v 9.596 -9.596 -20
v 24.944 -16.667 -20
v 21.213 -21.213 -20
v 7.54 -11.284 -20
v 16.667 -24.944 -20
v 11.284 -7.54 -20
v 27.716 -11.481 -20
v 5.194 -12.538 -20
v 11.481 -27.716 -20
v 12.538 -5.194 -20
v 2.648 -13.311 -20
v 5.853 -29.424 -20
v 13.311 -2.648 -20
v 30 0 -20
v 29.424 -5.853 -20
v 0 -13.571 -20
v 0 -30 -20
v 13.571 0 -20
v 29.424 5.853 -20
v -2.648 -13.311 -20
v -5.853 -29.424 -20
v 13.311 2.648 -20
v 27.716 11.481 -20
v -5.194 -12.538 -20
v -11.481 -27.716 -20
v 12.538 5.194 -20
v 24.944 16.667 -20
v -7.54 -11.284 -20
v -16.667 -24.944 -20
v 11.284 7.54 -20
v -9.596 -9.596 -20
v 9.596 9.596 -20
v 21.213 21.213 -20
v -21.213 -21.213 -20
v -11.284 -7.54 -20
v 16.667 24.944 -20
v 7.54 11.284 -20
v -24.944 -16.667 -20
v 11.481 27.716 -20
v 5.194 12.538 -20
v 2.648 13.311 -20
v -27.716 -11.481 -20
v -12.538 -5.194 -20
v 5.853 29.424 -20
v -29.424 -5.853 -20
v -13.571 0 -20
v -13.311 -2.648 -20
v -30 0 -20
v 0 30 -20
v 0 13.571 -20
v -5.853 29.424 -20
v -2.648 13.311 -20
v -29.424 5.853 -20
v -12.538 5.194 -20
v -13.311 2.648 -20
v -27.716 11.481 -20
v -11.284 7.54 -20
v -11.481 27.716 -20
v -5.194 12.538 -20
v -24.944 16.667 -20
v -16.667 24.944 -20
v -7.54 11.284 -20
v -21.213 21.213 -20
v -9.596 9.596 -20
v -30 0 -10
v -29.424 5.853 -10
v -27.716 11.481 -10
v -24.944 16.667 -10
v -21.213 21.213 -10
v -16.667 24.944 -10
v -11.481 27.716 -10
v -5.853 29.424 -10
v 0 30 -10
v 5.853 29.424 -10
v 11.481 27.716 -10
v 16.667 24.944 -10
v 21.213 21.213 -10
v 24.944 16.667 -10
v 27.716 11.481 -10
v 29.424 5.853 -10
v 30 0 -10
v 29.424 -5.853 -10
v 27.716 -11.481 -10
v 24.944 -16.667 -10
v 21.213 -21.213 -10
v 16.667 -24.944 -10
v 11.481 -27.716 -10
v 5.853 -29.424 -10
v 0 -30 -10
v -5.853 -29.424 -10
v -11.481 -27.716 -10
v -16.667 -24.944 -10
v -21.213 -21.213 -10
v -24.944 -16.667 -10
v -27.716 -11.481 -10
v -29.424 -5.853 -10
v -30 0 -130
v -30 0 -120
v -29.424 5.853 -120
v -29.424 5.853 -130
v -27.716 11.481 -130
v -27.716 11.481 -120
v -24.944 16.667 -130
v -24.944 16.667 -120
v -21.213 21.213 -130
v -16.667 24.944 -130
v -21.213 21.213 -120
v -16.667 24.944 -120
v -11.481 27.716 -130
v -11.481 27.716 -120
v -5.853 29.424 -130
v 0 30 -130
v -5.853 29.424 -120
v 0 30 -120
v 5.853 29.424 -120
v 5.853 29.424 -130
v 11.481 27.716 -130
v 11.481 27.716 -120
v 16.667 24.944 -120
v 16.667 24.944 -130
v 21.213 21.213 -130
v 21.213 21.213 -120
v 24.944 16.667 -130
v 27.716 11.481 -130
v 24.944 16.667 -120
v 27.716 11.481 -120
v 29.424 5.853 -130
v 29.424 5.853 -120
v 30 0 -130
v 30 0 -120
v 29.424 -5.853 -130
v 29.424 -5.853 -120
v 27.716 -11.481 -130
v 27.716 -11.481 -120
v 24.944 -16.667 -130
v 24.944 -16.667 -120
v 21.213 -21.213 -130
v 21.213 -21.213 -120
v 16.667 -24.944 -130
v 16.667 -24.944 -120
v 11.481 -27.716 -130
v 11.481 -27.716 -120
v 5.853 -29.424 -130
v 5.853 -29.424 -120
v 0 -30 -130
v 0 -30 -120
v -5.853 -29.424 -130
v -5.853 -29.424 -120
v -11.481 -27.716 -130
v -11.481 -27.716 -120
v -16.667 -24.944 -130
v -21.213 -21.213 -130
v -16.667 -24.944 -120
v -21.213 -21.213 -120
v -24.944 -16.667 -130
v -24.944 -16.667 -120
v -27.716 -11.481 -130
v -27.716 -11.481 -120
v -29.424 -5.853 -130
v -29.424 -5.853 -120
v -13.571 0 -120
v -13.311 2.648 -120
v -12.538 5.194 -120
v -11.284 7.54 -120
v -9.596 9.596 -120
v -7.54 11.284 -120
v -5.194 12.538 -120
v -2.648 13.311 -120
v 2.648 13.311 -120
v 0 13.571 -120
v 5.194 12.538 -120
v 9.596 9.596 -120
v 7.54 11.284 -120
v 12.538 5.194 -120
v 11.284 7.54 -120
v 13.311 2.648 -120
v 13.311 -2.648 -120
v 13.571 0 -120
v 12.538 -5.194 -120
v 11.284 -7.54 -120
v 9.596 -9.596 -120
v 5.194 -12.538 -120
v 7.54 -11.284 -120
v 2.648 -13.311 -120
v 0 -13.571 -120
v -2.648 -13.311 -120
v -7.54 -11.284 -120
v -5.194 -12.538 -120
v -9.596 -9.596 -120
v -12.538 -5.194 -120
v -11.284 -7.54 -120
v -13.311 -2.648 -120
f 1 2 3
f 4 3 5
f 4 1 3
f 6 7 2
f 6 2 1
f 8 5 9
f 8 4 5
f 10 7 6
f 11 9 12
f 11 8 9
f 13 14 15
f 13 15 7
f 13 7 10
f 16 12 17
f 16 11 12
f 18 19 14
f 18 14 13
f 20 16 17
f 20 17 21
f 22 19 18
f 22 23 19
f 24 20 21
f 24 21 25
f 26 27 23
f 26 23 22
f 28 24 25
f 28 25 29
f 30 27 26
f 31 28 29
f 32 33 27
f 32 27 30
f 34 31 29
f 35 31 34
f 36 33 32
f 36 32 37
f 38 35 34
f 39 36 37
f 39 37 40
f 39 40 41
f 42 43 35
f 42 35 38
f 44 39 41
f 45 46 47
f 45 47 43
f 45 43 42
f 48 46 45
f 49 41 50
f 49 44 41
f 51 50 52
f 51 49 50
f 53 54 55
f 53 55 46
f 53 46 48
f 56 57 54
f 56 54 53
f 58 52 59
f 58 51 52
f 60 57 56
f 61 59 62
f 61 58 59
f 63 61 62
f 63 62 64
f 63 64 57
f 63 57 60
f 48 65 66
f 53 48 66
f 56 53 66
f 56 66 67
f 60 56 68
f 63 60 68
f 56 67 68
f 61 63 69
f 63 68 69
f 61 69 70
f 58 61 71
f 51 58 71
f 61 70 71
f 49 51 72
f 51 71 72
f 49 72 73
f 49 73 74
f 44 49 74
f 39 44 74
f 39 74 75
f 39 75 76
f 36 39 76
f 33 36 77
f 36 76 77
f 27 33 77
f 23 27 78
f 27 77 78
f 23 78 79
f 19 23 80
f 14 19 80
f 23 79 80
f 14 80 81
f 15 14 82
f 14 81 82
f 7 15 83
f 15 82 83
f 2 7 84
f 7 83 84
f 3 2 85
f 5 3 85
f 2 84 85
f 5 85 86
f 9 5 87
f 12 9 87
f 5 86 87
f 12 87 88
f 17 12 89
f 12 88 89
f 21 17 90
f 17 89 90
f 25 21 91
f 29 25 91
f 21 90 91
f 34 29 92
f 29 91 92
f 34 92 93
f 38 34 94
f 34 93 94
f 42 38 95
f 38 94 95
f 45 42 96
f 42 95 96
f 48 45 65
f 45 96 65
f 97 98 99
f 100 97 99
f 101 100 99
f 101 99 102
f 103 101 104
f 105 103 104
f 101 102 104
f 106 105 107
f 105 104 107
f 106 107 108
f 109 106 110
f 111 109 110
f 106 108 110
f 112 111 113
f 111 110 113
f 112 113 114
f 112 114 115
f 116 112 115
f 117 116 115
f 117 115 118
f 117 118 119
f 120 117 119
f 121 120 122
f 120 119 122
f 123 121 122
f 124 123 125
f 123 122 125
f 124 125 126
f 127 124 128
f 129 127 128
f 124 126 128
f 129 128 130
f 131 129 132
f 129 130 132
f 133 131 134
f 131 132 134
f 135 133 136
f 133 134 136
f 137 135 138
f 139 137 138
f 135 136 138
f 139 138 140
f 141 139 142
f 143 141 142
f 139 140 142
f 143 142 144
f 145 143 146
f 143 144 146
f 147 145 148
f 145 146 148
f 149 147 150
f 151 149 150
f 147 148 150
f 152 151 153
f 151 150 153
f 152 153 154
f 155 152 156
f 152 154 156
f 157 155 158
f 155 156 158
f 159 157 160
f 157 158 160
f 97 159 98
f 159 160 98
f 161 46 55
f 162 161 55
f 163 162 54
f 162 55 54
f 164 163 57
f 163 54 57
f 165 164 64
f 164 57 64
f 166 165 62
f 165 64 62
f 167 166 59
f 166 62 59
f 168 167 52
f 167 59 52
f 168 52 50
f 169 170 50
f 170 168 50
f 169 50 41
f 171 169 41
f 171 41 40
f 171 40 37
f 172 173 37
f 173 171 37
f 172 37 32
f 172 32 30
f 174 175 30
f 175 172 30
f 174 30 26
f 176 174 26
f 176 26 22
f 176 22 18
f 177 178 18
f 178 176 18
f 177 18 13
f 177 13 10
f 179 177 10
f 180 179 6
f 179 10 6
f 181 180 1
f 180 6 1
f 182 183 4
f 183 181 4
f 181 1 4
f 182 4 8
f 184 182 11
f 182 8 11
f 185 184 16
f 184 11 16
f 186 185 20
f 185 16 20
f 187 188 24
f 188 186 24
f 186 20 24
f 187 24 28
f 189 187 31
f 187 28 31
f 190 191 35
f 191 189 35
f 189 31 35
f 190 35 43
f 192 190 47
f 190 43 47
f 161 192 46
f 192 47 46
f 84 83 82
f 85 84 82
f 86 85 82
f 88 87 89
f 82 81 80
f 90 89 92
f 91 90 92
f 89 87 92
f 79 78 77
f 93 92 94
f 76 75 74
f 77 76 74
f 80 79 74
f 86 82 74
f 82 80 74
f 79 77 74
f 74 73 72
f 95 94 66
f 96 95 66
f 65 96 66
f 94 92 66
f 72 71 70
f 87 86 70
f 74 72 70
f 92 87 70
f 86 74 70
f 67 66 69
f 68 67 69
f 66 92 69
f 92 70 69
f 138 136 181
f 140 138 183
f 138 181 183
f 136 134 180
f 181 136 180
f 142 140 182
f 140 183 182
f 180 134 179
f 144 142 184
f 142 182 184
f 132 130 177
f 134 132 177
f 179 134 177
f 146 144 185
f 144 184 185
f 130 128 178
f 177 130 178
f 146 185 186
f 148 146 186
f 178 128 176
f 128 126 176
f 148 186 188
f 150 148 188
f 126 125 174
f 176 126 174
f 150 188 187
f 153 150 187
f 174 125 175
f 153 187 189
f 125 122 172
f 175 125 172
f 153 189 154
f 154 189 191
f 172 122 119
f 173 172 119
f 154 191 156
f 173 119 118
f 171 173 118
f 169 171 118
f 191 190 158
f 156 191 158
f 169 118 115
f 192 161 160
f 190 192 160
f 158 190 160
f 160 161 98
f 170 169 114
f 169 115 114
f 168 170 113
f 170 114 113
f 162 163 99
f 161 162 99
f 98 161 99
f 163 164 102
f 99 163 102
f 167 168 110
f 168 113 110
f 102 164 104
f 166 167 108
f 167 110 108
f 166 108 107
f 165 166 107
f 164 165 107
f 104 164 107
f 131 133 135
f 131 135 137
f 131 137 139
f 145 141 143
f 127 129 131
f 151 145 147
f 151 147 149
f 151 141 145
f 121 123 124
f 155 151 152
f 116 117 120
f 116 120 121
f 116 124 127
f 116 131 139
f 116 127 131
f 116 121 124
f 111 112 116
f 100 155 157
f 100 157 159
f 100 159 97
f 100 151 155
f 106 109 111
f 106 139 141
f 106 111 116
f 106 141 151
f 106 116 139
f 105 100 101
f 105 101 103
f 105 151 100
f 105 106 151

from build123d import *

# Parameters (mm, degrees)
ESBO_O1_2_R             = 48.65
EXTRUSI_N_1_DEPTH       = 490
CORTE_BARRIDO_1_PITCH   = 101.6
CORTE_BARRIDO_1_HEIGHT  = 914.4
CORTE_BARRIDO_1_RADIUS  = 48.65
CROQUIS_3_RX            = 47.863125
CROQUIS_3_RY            = 47.863125
CROQUIS3_R              = 13
SALIENTE_EXTRUIR1_DEPTH = 490
CROQUIS4_R              = 49
SALIENTE_EXTRUIR2_DEPTH = 10
CROQUIS5_R              = 13.571471
SALIENTE_EXTRUIR3_DEPTH = 120
CHAFL_N2_SIZE           = 2
CROQUIS19_W             = 451.947205317
CROQUIS19_H             = 279.188572138
CORTAR_EXTRUIR4_DEPTH   = 721
CROQUIS20_R             = 30
SALIENTE_EXTRUIR4_DEPTH = 10
SALIENTE_EXTRUIR5_START = -10
CROQUIS21_R             = 30
SALIENTE_EXTRUIR5_DEPTH = 10


with BuildPart() as part:
    # Esboço1<2> → Extrusión 1 (new body)
    with BuildSketch(Plane.XY):
        Circle(ESBO_O1_2_R)
    extrude(amount=EXTRUSI_N_1_DEPTH)

    # Corte Barrido 1: sweep along a helix
    with BuildLine() as corte_barrido_1_path:
        Helix(CORTE_BARRIDO_1_PITCH, CORTE_BARRIDO_1_HEIGHT, CORTE_BARRIDO_1_RADIUS, center=(0, 0, 0), direction=(0, 0, 1), lefthand=True)
    # Croquis 3 → Corte Barrido 1 (sweep, cut)
    with BuildSketch(Plane(origin=(0, 0, 0), x_dir=(1, 0, 0), z_dir=(0, 1, 0))):
        with Locations(Location((-48.65, 0), (0, 0, -180))):
            Ellipse(CROQUIS_3_RX, CROQUIS_3_RY)
    sweep(path=corte_barrido_1_path.line, is_frenet=True, mode=Mode.SUBTRACT)

    # Croquis3 → Saliente-Extruir1 (add)
    with BuildSketch(Plane(origin=(0, 0, 0), x_dir=(-1, 0, 0), z_dir=(0, 0, -1))):
        Circle(CROQUIS3_R)
    extrude(amount=-SALIENTE_EXTRUIR1_DEPTH)

    # Croquis4 → Saliente-Extruir2 (add)
    with BuildSketch(Plane(origin=(0, 0, 0), x_dir=(-1, 0, 0), z_dir=(0, 0, -1))):
        Circle(CROQUIS4_R)
    extrude(amount=SALIENTE_EXTRUIR2_DEPTH)

    # Croquis5 → Saliente-Extruir3 (add)
    with BuildSketch(Plane(origin=(0, 0, -10), x_dir=(-1, 0, 0), z_dir=(0, 0, -1))):
        Circle(CROQUIS5_R)
    extrude(amount=SALIENTE_EXTRUIR3_DEPTH)

    # Croquis11 → Revolución1 (revolve)
    with BuildSketch(Plane(origin=(0, 0, 0), x_dir=(0, 0, -1), z_dir=(1, 0, 0)), mode=Mode.PRIVATE) as revoluci_n1_sk:
        Polygon((-490, -13), (-490, 0), (-564, 0), (-564, -6), (-526, -6), (-526, -13), (-495, -13), align=None)
    revolve(revoluci_n1_sk.sketch.rotate(Axis((0, 0, 490), (0, 0, 1)), 270), axis=Axis((0, 0, 490), (0, 0, 1)))

    # Chaflán2
    chafl_n2_edges = [part.edges().sort_by_distance(p)[0] for p in [
        (6, 0, 564),
    ]]
    chamfer(chafl_n2_edges, length=CHAFL_N2_SIZE)

    # Croquis12 → Cortar-Revolución1 (revolve, cut)
    with BuildSketch(Plane(origin=(0, 0, 0), x_dir=(1, 0, 0), z_dir=(0, 1, 0))):
        Polygon((-13, -505), (-12, -505), (-12, -509.7), (-13, -509.7), (-15.609105151, -509.7), (-15.609105151, -505), align=None)
    revolve(axis=Axis((0, 0, 526), (0, 0, -1)), mode=Mode.SUBTRACT)

    # Croquis19 → Cortar-Extruir4 (cut)
    with BuildSketch(Plane(origin=(0, 0, -10), x_dir=(-1, 0, 0), z_dir=(0, 0, -1))):
        with Locations((-30.102891015, -20.278452223)):
            Rectangle(CROQUIS19_W, CROQUIS19_H)
    extrude(amount=-CORTAR_EXTRUIR4_DEPTH, mode=Mode.SUBTRACT)

    # Croquis20 → Saliente-Extruir4 (add)
    with BuildSketch(Plane(origin=(0, 0, -10), x_dir=(-1, 0, 0), z_dir=(0, 0, -1))):
        Circle(CROQUIS20_R)
    extrude(amount=SALIENTE_EXTRUIR4_DEPTH)

    # Croquis21 → Saliente-Extruir5 (add)
    with BuildSketch(Plane(origin=(0, 0, -130), x_dir=(-1, 0, 0), z_dir=(0, 0, -1)).offset(SALIENTE_EXTRUIR5_START)):
        Circle(CROQUIS21_R)
    extrude(amount=SALIENTE_EXTRUIR5_DEPTH)


solid = part.part
